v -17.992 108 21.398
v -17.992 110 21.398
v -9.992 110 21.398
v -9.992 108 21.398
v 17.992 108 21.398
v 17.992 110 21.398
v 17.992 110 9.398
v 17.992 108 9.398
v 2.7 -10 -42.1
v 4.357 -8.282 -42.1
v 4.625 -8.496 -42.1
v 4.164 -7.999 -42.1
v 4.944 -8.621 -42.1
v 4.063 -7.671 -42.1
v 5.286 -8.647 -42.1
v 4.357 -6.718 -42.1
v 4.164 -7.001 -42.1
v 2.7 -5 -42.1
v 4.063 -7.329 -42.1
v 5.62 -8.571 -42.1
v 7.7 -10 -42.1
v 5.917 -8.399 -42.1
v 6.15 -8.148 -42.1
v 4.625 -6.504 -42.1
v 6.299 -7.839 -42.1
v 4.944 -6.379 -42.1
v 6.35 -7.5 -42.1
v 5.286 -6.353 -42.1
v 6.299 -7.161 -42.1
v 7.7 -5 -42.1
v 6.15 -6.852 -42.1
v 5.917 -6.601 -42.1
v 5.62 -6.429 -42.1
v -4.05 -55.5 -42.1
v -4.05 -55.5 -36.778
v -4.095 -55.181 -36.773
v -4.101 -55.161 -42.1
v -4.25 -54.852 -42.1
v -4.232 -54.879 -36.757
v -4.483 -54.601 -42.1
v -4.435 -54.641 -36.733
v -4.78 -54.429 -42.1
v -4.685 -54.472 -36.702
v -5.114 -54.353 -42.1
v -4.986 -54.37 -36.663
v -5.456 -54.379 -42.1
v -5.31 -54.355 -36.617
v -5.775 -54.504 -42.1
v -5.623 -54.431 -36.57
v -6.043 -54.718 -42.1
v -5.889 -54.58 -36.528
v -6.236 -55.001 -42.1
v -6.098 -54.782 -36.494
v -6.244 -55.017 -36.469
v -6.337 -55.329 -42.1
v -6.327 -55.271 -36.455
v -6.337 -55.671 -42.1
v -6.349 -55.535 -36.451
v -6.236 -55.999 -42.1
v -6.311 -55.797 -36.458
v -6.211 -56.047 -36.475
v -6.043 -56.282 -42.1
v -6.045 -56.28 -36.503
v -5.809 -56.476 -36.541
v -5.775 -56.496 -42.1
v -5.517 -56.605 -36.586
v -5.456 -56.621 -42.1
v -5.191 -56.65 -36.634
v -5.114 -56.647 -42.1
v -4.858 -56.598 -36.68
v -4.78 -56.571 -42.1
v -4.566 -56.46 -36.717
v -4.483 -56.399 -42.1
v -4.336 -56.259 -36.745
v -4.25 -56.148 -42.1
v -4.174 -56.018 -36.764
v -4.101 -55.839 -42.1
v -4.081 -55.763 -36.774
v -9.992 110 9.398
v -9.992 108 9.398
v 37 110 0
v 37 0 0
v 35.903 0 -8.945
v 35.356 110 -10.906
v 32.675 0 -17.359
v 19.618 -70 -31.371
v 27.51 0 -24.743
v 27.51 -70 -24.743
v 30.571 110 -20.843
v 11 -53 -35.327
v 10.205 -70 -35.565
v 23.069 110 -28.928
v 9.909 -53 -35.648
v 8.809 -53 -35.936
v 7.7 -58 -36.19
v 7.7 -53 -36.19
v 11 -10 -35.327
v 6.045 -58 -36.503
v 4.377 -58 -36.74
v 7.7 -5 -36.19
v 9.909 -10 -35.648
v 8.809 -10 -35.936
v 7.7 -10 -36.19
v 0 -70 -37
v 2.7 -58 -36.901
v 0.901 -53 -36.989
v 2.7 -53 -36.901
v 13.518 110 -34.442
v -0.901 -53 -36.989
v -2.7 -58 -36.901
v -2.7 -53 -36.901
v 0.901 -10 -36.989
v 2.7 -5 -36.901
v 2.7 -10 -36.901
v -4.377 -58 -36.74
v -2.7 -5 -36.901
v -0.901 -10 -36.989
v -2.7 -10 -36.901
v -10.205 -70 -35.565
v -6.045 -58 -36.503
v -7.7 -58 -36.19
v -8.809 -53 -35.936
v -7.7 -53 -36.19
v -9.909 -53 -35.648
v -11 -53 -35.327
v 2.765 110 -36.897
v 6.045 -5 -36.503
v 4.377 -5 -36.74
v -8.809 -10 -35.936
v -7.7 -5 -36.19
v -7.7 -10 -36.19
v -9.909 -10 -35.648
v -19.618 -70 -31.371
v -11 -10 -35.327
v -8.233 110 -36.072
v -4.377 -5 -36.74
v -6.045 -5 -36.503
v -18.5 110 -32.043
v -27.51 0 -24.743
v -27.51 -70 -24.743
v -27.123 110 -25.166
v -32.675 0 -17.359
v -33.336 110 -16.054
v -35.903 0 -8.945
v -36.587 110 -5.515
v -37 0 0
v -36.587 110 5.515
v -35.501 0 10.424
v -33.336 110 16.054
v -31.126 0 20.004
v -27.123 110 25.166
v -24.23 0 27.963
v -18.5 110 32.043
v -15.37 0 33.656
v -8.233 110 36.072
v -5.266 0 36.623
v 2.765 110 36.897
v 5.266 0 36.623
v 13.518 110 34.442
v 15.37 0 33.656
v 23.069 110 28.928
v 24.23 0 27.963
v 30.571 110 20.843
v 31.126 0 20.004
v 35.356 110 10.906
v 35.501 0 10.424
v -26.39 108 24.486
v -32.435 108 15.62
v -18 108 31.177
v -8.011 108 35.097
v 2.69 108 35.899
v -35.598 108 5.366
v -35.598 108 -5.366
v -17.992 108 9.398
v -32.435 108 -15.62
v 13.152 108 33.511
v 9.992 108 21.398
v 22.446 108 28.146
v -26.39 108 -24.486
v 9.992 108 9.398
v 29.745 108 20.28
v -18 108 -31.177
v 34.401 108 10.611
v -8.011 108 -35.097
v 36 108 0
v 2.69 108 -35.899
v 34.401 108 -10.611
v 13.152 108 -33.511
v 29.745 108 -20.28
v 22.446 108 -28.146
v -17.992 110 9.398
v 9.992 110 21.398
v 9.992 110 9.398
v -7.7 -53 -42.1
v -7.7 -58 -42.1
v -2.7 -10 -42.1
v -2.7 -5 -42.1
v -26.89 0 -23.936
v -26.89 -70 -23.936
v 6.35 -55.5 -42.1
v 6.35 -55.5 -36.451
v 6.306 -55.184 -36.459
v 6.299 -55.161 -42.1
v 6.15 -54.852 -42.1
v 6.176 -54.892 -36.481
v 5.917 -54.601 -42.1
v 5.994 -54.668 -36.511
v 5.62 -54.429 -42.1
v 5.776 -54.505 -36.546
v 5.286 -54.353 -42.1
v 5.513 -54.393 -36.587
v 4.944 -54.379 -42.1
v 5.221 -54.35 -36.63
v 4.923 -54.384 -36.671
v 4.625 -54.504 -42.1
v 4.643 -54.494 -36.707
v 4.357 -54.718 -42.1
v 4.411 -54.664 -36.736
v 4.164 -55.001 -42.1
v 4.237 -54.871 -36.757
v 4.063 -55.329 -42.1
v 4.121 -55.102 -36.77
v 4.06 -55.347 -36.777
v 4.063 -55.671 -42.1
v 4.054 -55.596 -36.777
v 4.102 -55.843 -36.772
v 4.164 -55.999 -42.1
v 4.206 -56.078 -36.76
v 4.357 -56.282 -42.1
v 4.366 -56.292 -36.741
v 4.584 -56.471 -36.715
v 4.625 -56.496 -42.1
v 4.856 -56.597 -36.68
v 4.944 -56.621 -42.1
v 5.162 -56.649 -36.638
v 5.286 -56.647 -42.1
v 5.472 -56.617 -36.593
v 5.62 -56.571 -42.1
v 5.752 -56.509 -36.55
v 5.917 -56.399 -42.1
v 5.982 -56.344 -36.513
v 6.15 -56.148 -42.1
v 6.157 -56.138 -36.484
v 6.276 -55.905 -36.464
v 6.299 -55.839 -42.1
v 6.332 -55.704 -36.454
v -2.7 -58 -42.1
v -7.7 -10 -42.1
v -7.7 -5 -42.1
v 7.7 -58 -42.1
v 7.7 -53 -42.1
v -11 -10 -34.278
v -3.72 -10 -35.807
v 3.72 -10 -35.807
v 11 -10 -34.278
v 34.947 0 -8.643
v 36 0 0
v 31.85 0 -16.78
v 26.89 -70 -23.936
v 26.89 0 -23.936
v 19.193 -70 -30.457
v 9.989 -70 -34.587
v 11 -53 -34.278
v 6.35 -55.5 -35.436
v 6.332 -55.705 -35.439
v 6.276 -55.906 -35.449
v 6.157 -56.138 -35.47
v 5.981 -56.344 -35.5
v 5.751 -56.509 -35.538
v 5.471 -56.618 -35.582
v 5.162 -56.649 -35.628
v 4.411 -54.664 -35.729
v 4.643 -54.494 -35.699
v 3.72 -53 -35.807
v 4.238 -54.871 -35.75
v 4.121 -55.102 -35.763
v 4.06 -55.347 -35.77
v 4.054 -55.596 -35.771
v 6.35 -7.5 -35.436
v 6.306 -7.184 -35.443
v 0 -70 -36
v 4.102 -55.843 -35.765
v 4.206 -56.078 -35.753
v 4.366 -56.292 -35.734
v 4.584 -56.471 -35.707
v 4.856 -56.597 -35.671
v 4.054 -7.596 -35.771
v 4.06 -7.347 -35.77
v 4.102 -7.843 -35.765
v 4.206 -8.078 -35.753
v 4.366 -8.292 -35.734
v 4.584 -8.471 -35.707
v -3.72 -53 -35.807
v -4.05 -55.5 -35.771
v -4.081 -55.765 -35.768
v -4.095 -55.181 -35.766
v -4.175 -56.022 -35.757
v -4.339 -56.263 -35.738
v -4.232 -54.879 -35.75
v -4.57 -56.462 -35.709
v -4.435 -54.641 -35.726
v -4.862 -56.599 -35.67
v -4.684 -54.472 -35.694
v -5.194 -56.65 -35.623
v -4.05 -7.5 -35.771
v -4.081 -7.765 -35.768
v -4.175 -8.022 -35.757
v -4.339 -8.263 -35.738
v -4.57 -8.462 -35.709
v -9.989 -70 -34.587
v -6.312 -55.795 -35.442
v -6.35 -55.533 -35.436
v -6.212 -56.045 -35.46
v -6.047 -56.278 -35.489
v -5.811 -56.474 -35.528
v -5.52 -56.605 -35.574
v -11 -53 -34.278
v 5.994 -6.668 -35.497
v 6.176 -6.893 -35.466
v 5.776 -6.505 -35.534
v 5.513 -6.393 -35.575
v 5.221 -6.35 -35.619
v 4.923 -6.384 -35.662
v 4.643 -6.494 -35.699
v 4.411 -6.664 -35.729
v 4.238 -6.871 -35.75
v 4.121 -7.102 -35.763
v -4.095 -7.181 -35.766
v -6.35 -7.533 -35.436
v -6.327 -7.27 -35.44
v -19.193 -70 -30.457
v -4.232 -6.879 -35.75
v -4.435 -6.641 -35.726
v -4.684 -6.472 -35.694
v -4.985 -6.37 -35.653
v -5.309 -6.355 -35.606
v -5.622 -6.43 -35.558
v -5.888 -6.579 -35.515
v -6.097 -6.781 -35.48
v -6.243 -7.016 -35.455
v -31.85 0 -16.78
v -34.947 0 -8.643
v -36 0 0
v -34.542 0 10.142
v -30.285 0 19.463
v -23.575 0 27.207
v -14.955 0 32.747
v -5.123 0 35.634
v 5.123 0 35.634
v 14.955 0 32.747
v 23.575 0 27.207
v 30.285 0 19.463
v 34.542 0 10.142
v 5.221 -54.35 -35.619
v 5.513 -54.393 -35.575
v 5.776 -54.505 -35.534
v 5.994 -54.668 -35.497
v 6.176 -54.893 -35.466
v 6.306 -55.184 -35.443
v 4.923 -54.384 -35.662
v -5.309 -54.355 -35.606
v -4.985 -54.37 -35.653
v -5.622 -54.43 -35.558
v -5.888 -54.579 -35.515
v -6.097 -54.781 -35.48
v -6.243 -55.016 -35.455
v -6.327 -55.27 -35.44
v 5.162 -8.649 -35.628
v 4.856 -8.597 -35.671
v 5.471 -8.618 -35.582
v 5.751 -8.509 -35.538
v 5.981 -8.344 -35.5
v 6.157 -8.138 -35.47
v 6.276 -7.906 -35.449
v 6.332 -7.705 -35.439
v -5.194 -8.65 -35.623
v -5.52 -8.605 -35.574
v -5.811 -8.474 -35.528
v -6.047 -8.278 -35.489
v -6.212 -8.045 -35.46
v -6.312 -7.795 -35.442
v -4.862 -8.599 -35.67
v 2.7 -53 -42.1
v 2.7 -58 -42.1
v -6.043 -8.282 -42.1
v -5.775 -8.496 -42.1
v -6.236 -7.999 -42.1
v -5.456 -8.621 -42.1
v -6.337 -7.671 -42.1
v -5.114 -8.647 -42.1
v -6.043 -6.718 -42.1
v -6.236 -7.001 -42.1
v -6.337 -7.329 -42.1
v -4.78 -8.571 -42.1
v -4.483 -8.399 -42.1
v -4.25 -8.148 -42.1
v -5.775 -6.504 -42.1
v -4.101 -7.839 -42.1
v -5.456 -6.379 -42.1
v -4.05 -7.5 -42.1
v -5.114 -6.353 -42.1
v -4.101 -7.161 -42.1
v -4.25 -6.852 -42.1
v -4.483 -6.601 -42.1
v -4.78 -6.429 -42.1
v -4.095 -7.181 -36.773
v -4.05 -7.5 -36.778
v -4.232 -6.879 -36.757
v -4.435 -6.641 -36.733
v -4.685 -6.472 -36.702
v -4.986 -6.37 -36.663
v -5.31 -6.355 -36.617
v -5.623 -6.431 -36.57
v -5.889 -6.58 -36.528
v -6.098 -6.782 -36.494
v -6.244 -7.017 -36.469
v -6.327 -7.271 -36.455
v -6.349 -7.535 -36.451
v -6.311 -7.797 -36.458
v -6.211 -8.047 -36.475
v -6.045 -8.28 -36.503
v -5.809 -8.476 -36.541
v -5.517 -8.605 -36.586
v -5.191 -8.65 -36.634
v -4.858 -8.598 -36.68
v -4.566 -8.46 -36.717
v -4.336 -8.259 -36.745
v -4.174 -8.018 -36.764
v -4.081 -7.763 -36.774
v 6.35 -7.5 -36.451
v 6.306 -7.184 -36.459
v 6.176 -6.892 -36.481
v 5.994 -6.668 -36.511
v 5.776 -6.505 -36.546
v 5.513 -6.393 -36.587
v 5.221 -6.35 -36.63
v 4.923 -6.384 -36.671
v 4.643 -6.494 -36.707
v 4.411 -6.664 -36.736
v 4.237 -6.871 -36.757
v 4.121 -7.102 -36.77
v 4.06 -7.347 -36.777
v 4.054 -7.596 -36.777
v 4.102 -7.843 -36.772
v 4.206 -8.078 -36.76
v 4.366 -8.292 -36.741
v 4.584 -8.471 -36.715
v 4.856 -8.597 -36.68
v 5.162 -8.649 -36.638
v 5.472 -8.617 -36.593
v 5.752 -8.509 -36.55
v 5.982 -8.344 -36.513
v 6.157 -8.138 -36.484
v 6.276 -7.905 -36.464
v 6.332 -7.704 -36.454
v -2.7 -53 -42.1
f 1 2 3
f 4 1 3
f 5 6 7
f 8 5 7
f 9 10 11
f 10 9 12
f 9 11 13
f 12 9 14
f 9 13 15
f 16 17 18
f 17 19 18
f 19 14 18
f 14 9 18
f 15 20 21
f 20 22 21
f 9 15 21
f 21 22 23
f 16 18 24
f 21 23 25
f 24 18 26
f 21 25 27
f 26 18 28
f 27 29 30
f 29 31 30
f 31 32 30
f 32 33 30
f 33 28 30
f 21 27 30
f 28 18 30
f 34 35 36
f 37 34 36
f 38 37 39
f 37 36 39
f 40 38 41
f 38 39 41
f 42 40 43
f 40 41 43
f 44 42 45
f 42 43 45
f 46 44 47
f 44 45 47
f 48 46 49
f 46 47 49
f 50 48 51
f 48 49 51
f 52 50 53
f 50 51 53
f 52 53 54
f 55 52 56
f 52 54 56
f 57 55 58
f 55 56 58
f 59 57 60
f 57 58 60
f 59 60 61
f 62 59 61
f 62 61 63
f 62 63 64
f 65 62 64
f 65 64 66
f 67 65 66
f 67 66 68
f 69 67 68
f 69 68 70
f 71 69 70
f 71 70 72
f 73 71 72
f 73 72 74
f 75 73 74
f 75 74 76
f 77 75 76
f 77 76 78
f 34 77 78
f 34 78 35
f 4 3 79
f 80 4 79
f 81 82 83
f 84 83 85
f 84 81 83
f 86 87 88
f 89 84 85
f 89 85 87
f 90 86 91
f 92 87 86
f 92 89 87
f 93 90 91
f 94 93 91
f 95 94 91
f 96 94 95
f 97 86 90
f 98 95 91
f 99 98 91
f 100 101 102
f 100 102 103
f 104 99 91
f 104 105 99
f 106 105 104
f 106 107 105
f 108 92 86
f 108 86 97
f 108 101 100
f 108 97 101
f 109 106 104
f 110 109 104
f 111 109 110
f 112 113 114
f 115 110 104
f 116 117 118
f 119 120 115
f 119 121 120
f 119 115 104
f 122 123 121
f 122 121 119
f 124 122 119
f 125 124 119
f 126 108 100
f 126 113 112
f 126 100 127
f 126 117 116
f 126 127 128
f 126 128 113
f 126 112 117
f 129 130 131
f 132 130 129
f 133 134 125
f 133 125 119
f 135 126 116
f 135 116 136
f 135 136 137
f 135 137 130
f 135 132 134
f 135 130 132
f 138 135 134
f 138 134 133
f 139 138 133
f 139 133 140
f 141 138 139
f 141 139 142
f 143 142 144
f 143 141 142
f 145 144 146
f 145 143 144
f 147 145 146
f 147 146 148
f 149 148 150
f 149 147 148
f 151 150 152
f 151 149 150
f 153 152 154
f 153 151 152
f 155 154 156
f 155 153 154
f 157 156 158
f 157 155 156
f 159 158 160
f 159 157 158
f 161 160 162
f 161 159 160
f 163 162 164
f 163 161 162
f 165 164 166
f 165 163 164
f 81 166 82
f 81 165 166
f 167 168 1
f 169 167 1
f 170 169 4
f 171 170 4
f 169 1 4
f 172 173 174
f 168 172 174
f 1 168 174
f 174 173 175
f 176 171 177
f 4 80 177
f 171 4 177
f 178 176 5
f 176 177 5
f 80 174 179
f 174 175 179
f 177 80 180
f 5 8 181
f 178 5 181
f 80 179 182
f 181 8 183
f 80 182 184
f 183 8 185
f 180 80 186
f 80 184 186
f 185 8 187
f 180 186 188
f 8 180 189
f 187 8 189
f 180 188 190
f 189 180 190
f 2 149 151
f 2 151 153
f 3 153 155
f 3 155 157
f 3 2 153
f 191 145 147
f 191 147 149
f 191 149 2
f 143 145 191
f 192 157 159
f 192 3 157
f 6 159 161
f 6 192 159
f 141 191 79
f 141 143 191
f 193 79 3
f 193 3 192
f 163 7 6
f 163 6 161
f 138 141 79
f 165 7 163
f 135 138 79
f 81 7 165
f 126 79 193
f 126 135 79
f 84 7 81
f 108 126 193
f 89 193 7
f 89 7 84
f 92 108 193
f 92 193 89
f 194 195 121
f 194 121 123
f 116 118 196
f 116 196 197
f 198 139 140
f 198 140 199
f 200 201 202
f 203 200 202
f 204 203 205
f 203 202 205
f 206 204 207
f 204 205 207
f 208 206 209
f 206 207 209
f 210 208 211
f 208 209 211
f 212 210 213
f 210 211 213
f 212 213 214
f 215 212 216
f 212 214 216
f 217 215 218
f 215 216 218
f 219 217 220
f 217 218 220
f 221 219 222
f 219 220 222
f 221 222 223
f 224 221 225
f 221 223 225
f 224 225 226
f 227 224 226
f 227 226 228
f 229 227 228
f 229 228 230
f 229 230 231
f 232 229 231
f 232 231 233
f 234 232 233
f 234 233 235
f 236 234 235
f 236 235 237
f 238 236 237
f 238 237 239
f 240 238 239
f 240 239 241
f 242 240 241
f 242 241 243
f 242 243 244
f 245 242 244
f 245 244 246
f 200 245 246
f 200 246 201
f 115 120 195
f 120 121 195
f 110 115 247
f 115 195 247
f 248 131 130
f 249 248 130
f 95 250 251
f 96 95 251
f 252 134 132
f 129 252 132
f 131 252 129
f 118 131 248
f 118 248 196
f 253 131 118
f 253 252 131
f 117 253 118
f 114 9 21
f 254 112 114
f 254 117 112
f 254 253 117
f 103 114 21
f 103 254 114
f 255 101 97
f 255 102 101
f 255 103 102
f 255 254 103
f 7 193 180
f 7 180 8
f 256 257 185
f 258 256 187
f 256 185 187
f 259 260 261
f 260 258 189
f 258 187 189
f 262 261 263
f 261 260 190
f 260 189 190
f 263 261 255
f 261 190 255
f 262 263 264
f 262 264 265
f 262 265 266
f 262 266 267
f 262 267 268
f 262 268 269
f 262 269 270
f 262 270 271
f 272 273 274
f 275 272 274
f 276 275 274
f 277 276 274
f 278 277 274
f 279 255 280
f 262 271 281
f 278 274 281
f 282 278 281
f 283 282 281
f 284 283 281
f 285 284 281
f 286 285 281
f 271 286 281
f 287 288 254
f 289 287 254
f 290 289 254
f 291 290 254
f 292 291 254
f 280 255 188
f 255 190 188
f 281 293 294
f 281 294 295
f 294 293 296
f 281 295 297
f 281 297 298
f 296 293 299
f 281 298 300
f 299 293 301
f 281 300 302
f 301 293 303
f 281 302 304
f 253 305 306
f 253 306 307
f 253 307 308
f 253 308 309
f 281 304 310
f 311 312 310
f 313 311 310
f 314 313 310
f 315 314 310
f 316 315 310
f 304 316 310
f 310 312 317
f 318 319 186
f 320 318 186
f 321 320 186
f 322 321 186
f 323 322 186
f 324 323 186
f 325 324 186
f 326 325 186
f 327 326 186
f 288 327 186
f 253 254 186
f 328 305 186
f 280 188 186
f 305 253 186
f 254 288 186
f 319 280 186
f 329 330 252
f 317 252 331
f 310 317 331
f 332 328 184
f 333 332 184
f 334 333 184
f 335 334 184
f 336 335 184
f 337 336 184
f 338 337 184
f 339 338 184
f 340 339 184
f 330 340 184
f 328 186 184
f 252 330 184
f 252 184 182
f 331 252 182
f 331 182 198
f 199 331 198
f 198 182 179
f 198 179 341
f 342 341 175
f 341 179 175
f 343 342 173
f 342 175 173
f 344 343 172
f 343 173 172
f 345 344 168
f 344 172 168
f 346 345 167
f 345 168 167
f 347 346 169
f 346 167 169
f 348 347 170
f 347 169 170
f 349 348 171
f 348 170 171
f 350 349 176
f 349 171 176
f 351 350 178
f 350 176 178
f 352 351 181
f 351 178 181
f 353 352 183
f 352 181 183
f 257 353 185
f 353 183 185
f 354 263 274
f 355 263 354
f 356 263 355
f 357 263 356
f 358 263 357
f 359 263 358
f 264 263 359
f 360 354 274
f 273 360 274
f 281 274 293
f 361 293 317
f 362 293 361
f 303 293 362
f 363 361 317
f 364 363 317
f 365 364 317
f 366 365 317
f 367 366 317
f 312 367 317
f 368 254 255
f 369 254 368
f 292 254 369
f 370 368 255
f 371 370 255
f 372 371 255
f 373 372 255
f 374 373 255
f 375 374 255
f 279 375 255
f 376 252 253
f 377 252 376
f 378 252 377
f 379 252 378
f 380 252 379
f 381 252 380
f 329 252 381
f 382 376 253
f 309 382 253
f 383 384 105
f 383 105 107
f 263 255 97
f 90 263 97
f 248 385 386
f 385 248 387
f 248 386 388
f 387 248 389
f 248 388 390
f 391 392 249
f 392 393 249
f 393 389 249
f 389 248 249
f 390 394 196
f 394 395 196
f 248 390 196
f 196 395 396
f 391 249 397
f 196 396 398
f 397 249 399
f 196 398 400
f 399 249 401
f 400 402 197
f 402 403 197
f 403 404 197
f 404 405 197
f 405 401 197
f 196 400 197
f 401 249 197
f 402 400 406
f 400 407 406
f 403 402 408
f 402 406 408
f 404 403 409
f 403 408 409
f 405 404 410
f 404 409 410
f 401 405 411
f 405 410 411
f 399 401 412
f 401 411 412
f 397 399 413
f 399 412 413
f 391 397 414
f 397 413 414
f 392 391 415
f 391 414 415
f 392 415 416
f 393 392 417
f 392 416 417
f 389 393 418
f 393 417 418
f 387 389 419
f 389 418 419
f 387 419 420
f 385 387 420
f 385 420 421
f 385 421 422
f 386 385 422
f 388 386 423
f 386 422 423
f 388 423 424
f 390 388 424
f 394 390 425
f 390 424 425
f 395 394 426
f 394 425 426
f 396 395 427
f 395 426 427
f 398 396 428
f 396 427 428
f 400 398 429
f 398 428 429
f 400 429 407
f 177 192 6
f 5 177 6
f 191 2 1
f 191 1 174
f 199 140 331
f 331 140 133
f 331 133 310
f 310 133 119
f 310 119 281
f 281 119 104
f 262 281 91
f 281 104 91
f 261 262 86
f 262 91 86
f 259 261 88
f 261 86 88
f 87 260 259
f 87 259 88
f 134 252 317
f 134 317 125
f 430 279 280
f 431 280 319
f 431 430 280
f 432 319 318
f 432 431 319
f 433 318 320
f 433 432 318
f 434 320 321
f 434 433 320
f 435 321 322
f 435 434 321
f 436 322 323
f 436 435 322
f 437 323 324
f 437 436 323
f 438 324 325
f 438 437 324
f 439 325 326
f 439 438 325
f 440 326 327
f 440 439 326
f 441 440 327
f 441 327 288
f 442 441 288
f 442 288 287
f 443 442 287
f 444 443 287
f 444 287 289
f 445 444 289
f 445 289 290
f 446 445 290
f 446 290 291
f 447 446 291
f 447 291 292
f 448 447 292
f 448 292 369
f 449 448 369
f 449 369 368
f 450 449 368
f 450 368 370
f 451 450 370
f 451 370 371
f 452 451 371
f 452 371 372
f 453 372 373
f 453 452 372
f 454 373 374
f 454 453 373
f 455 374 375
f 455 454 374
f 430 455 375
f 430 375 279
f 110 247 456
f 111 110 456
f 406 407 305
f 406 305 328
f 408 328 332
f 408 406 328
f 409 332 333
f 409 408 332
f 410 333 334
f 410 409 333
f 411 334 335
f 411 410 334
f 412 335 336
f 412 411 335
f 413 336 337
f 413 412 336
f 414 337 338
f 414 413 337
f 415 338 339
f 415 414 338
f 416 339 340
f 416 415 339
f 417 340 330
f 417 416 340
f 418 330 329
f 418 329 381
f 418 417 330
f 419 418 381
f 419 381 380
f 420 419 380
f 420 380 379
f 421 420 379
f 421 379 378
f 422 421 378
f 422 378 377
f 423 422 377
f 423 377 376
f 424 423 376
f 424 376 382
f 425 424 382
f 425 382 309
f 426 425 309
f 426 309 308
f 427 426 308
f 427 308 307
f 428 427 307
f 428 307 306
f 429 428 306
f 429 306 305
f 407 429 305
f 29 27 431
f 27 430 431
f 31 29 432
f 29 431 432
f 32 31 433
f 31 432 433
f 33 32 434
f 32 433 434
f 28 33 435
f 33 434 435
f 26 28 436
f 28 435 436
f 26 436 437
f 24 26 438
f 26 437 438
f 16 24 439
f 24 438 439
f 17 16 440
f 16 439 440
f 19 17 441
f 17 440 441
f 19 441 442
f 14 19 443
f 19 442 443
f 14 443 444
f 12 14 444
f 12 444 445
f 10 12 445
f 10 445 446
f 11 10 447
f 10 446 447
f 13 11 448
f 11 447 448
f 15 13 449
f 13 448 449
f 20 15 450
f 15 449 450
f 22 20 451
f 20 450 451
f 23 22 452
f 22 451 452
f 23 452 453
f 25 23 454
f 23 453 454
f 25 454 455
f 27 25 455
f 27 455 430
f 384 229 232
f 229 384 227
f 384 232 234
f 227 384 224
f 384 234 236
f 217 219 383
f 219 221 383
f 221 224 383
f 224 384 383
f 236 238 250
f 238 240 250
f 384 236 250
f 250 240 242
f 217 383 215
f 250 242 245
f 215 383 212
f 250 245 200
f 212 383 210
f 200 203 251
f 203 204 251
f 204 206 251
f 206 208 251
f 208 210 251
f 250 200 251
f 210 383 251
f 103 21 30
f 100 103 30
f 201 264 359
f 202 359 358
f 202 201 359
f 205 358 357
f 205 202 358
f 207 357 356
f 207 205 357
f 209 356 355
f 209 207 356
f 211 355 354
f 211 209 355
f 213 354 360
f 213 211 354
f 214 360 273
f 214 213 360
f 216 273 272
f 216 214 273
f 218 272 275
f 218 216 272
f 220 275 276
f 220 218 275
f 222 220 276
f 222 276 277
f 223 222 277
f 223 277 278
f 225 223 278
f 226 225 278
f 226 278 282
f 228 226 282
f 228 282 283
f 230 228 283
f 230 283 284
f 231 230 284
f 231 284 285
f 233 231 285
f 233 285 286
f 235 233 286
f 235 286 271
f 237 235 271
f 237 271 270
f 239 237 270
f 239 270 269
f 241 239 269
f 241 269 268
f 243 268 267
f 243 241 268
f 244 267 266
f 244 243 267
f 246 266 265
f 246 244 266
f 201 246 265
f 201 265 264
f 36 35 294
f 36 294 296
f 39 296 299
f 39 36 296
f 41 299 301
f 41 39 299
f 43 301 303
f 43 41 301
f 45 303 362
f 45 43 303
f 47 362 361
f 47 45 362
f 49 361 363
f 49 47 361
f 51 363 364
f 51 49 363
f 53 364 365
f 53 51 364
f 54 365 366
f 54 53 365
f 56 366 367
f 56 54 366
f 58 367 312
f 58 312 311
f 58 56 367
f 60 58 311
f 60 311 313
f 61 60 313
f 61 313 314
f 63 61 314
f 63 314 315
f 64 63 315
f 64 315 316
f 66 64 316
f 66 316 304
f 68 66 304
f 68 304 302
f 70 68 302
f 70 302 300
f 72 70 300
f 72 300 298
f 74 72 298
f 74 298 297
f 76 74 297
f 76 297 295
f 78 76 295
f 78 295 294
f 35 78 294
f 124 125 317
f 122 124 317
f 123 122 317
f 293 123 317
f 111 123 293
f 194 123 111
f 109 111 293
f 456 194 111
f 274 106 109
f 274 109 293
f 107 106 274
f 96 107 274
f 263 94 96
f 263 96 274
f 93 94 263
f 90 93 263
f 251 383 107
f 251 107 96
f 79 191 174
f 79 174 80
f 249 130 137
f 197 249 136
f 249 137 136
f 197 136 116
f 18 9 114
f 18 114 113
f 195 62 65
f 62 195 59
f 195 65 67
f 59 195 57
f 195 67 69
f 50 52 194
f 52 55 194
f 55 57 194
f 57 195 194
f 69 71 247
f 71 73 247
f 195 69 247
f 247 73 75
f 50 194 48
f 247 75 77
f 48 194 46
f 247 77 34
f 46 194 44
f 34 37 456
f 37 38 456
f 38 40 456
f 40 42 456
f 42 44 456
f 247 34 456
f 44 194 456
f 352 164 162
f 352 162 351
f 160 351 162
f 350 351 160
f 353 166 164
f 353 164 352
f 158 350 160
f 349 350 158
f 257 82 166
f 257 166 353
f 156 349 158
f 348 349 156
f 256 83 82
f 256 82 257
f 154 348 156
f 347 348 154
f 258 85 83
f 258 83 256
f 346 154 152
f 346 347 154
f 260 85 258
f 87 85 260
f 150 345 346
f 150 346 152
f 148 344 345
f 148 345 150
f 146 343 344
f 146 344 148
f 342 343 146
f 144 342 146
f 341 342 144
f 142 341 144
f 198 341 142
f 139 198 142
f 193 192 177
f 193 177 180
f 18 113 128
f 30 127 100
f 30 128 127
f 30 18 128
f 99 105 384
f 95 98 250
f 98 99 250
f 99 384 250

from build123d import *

# Parameters (mm, degrees)
SKETCH_1_R               = 37
EXTRUDE_1_DEPTH          = 110
EXTRUDE_1_DEPTH_BACK     = 70
SKETCH_2_R               = 36
CUT_EXTRUDE_1_DEPTH      = 108
CUT_EXTRUDE_1_DEPTH_BACK = 70
CUT_EXTRUDE_6_DEPTH      = 70
SKETCH_7_W               = 22
SKETCH_7_H               = 20
CUT_EXTRUDE_7_DEPTH      = 43
SKETCH_10_W              = 8
SKETCH_10_H              = 12
CUT_EXTRUDE_8_DEPTH      = 8.1
SKETCH_12_W              = 5
SKETCH_12_H              = 5
SKETCH_12_R              = 1.15
EXTRUDE_3_DEPTH          = 1
EXTRUDE_3_DEPTH_BACK     = 5.1
SKETCH_13_R              = 1.15
CUT_EXTRUDE_9_DEPTH      = 18.4


with BuildPart() as part:
    # 草圖1 → 填料-伸長1 (new body, two sides)
    with BuildSketch(Plane(origin=(0, 0, 0), x_dir=(1, 0, 0), z_dir=(0, 1, 0))) as extrude_1_sk:
        Circle(SKETCH_1_R)
    extrude(amount=EXTRUDE_1_DEPTH)
    extrude(extrude_1_sk.sketch, amount=-EXTRUDE_1_DEPTH_BACK)

    # 草圖2 → 除料-伸長1 (cut, two sides)
    with BuildSketch(Plane(origin=(0, 0, 0), x_dir=(1, 0, 0), z_dir=(0, 1, 0))) as cut_extrude_1_sk:
        Circle(SKETCH_2_R)
    extrude(amount=CUT_EXTRUDE_1_DEPTH, mode=Mode.SUBTRACT)
    extrude(cut_extrude_1_sk.sketch, amount=-CUT_EXTRUDE_1_DEPTH_BACK, mode=Mode.SUBTRACT)

    # 草圖6 → 除料-伸長6 (cut)
    with BuildSketch(Plane(origin=(0, 0, 0), x_dir=(1, 0, 0), z_dir=(0, 1, 0))):
        with BuildLine():
            Line((-36, 0), (26.300758937, 0))
            Line((26.300758937, 0), (36, 0))
            ThreePointArc((36, 0), (33.645512806, 12.805446811), (26.890029553, 23.935879149))
            Line((26.890029553, 23.935879149), (27.509698295, 24.743009108))
            ThreePointArc((27.509698295, 24.743009108), (34.546047798, 13.25030496), (37, 0))
            ThreePointArc((37, 0), (0, -37), (-37, 0))
            ThreePointArc((-37, 0), (-34.546047798, 13.25030496), (-27.509698295, 24.743009108))
            Line((-27.509698295, 24.743009108), (-26.890029553, 23.935879149))
            ThreePointArc((-26.890029553, 23.935879149), (-33.645512806, 12.805446811), (-36, 0))
        make_face()
    extrude(amount=-CUT_EXTRUDE_6_DEPTH, mode=Mode.SUBTRACT)

    # 草圖7 → 除料-伸長7 (cut)
    with BuildSketch(Plane(origin=(0, -10, 0), x_dir=(1, 0, 0), z_dir=(0, 1, 0))):
        with Locations((0, 27.910624132)):
            Rectangle(SKETCH_7_W, SKETCH_7_H)
    extrude(amount=-CUT_EXTRUDE_7_DEPTH, mode=Mode.SUBTRACT)

    # 草圖10 → 除料-伸長8 (cut)
    with BuildSketch(Plane(origin=(0, 110, 0), x_dir=(1, 0, 0), z_dir=(0, 1, 0))):
        with Locations((-13.992241726, -15.397733401)):
            Rectangle(SKETCH_10_W, SKETCH_10_H)
        with Locations((13.992241726, -15.397733401)):
            Rectangle(SKETCH_10_W, SKETCH_10_H)
    extrude(amount=-CUT_EXTRUDE_8_DEPTH, mode=Mode.SUBTRACT)

    # 草圖12 → 填料-伸長3 (add, two sides)
    with BuildSketch(Plane.XY.offset(-37)) as extrude_3_sk:
        with Locations((-5.2, -7.5)):
            Rectangle(SKETCH_12_W, SKETCH_12_H)
        with Locations((-5.2, -7.5)):
            Circle(SKETCH_12_R, mode=Mode.SUBTRACT)
        with Locations((5.2, -7.5)):
            Rectangle(SKETCH_12_W, SKETCH_12_H)
        with Locations((5.2, -7.5)):
            Circle(SKETCH_12_R, mode=Mode.SUBTRACT)
        with Locations((5.2, -55.5)):
            Rectangle(SKETCH_12_W, SKETCH_12_H)
        with Locations((5.2, -55.5)):
            Circle(SKETCH_12_R, mode=Mode.SUBTRACT)
        with Locations((-5.2, -55.5)):
            Rectangle(SKETCH_12_W, SKETCH_12_H)
        with Locations((-5.2, -55.5)):
            Circle(SKETCH_12_R, mode=Mode.SUBTRACT)
    extrude(amount=EXTRUDE_3_DEPTH)
    extrude(extrude_3_sk.sketch, amount=-EXTRUDE_3_DEPTH_BACK)

    # 草圖13 → 除料-伸長9 (cut)
    with BuildSketch(Plane.XY.offset(-37)):
        with Locations((5.2, -7.5)):
            Circle(SKETCH_13_R)
        with Locations((-5.2, -7.5)):
            Circle(SKETCH_13_R)
        with Locations((-5.2, -55.5)):
            Circle(SKETCH_13_R)
        with Locations((5.2, -55.5)):
            Circle(SKETCH_13_R)
    extrude(amount=CUT_EXTRUDE_9_DEPTH, mode=Mode.SUBTRACT)


solid = part.part
